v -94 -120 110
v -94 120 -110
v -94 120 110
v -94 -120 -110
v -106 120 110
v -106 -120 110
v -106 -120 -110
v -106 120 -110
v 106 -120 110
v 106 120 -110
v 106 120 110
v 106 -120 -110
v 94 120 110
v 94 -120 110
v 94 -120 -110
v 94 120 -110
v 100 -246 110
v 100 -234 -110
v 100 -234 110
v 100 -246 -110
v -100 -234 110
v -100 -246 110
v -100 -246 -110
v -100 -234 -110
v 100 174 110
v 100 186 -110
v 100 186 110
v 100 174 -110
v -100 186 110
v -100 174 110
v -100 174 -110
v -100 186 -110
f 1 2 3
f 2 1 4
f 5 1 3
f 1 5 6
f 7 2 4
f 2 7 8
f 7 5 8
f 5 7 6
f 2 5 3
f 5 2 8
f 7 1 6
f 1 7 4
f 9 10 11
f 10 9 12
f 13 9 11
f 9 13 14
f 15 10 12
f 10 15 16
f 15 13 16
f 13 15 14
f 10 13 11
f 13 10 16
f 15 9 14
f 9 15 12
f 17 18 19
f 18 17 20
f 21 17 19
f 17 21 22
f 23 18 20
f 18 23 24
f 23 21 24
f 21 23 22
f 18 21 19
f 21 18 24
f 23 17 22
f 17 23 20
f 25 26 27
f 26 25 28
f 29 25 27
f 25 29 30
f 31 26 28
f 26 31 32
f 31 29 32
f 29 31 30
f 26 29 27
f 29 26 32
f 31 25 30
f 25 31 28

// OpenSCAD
speaker_width = 200;
speaker_height = 240;
speaker_depth = 220;

wall_thickness = 12;

module draw_sides( sides ) {
        if ( sides == -1 ) {
             translate( [ -speaker_width/2, 0, 0 ] ) {
                cube( [ wall_thickness, speaker_height, speaker_depth ], true );
             }
        } else if ( sides == 1 ) {
            translate( [ speaker_width/2, 0, 0 ] ) {
                cube( [ wall_thickness, speaker_height, speaker_depth ], true );
             }
        }   
}

module draw_top( which ) {
        if ( which == -1 ) {
             translate( [ 0, speaker_height*0.75, 0 ] ) {
                cube( [ speaker_width, wall_thickness, speaker_depth ], true );
             }
        } else if ( which == 1 ) {
            translate( [ 0, -speaker_height, 0 ] ) {
                  cube( [ speaker_width, wall_thickness, speaker_depth ], true );
             }
        }   
}


draw_sides( -1 );
draw_sides( 1 );
draw_top( 1 );
draw_top( -1 );
